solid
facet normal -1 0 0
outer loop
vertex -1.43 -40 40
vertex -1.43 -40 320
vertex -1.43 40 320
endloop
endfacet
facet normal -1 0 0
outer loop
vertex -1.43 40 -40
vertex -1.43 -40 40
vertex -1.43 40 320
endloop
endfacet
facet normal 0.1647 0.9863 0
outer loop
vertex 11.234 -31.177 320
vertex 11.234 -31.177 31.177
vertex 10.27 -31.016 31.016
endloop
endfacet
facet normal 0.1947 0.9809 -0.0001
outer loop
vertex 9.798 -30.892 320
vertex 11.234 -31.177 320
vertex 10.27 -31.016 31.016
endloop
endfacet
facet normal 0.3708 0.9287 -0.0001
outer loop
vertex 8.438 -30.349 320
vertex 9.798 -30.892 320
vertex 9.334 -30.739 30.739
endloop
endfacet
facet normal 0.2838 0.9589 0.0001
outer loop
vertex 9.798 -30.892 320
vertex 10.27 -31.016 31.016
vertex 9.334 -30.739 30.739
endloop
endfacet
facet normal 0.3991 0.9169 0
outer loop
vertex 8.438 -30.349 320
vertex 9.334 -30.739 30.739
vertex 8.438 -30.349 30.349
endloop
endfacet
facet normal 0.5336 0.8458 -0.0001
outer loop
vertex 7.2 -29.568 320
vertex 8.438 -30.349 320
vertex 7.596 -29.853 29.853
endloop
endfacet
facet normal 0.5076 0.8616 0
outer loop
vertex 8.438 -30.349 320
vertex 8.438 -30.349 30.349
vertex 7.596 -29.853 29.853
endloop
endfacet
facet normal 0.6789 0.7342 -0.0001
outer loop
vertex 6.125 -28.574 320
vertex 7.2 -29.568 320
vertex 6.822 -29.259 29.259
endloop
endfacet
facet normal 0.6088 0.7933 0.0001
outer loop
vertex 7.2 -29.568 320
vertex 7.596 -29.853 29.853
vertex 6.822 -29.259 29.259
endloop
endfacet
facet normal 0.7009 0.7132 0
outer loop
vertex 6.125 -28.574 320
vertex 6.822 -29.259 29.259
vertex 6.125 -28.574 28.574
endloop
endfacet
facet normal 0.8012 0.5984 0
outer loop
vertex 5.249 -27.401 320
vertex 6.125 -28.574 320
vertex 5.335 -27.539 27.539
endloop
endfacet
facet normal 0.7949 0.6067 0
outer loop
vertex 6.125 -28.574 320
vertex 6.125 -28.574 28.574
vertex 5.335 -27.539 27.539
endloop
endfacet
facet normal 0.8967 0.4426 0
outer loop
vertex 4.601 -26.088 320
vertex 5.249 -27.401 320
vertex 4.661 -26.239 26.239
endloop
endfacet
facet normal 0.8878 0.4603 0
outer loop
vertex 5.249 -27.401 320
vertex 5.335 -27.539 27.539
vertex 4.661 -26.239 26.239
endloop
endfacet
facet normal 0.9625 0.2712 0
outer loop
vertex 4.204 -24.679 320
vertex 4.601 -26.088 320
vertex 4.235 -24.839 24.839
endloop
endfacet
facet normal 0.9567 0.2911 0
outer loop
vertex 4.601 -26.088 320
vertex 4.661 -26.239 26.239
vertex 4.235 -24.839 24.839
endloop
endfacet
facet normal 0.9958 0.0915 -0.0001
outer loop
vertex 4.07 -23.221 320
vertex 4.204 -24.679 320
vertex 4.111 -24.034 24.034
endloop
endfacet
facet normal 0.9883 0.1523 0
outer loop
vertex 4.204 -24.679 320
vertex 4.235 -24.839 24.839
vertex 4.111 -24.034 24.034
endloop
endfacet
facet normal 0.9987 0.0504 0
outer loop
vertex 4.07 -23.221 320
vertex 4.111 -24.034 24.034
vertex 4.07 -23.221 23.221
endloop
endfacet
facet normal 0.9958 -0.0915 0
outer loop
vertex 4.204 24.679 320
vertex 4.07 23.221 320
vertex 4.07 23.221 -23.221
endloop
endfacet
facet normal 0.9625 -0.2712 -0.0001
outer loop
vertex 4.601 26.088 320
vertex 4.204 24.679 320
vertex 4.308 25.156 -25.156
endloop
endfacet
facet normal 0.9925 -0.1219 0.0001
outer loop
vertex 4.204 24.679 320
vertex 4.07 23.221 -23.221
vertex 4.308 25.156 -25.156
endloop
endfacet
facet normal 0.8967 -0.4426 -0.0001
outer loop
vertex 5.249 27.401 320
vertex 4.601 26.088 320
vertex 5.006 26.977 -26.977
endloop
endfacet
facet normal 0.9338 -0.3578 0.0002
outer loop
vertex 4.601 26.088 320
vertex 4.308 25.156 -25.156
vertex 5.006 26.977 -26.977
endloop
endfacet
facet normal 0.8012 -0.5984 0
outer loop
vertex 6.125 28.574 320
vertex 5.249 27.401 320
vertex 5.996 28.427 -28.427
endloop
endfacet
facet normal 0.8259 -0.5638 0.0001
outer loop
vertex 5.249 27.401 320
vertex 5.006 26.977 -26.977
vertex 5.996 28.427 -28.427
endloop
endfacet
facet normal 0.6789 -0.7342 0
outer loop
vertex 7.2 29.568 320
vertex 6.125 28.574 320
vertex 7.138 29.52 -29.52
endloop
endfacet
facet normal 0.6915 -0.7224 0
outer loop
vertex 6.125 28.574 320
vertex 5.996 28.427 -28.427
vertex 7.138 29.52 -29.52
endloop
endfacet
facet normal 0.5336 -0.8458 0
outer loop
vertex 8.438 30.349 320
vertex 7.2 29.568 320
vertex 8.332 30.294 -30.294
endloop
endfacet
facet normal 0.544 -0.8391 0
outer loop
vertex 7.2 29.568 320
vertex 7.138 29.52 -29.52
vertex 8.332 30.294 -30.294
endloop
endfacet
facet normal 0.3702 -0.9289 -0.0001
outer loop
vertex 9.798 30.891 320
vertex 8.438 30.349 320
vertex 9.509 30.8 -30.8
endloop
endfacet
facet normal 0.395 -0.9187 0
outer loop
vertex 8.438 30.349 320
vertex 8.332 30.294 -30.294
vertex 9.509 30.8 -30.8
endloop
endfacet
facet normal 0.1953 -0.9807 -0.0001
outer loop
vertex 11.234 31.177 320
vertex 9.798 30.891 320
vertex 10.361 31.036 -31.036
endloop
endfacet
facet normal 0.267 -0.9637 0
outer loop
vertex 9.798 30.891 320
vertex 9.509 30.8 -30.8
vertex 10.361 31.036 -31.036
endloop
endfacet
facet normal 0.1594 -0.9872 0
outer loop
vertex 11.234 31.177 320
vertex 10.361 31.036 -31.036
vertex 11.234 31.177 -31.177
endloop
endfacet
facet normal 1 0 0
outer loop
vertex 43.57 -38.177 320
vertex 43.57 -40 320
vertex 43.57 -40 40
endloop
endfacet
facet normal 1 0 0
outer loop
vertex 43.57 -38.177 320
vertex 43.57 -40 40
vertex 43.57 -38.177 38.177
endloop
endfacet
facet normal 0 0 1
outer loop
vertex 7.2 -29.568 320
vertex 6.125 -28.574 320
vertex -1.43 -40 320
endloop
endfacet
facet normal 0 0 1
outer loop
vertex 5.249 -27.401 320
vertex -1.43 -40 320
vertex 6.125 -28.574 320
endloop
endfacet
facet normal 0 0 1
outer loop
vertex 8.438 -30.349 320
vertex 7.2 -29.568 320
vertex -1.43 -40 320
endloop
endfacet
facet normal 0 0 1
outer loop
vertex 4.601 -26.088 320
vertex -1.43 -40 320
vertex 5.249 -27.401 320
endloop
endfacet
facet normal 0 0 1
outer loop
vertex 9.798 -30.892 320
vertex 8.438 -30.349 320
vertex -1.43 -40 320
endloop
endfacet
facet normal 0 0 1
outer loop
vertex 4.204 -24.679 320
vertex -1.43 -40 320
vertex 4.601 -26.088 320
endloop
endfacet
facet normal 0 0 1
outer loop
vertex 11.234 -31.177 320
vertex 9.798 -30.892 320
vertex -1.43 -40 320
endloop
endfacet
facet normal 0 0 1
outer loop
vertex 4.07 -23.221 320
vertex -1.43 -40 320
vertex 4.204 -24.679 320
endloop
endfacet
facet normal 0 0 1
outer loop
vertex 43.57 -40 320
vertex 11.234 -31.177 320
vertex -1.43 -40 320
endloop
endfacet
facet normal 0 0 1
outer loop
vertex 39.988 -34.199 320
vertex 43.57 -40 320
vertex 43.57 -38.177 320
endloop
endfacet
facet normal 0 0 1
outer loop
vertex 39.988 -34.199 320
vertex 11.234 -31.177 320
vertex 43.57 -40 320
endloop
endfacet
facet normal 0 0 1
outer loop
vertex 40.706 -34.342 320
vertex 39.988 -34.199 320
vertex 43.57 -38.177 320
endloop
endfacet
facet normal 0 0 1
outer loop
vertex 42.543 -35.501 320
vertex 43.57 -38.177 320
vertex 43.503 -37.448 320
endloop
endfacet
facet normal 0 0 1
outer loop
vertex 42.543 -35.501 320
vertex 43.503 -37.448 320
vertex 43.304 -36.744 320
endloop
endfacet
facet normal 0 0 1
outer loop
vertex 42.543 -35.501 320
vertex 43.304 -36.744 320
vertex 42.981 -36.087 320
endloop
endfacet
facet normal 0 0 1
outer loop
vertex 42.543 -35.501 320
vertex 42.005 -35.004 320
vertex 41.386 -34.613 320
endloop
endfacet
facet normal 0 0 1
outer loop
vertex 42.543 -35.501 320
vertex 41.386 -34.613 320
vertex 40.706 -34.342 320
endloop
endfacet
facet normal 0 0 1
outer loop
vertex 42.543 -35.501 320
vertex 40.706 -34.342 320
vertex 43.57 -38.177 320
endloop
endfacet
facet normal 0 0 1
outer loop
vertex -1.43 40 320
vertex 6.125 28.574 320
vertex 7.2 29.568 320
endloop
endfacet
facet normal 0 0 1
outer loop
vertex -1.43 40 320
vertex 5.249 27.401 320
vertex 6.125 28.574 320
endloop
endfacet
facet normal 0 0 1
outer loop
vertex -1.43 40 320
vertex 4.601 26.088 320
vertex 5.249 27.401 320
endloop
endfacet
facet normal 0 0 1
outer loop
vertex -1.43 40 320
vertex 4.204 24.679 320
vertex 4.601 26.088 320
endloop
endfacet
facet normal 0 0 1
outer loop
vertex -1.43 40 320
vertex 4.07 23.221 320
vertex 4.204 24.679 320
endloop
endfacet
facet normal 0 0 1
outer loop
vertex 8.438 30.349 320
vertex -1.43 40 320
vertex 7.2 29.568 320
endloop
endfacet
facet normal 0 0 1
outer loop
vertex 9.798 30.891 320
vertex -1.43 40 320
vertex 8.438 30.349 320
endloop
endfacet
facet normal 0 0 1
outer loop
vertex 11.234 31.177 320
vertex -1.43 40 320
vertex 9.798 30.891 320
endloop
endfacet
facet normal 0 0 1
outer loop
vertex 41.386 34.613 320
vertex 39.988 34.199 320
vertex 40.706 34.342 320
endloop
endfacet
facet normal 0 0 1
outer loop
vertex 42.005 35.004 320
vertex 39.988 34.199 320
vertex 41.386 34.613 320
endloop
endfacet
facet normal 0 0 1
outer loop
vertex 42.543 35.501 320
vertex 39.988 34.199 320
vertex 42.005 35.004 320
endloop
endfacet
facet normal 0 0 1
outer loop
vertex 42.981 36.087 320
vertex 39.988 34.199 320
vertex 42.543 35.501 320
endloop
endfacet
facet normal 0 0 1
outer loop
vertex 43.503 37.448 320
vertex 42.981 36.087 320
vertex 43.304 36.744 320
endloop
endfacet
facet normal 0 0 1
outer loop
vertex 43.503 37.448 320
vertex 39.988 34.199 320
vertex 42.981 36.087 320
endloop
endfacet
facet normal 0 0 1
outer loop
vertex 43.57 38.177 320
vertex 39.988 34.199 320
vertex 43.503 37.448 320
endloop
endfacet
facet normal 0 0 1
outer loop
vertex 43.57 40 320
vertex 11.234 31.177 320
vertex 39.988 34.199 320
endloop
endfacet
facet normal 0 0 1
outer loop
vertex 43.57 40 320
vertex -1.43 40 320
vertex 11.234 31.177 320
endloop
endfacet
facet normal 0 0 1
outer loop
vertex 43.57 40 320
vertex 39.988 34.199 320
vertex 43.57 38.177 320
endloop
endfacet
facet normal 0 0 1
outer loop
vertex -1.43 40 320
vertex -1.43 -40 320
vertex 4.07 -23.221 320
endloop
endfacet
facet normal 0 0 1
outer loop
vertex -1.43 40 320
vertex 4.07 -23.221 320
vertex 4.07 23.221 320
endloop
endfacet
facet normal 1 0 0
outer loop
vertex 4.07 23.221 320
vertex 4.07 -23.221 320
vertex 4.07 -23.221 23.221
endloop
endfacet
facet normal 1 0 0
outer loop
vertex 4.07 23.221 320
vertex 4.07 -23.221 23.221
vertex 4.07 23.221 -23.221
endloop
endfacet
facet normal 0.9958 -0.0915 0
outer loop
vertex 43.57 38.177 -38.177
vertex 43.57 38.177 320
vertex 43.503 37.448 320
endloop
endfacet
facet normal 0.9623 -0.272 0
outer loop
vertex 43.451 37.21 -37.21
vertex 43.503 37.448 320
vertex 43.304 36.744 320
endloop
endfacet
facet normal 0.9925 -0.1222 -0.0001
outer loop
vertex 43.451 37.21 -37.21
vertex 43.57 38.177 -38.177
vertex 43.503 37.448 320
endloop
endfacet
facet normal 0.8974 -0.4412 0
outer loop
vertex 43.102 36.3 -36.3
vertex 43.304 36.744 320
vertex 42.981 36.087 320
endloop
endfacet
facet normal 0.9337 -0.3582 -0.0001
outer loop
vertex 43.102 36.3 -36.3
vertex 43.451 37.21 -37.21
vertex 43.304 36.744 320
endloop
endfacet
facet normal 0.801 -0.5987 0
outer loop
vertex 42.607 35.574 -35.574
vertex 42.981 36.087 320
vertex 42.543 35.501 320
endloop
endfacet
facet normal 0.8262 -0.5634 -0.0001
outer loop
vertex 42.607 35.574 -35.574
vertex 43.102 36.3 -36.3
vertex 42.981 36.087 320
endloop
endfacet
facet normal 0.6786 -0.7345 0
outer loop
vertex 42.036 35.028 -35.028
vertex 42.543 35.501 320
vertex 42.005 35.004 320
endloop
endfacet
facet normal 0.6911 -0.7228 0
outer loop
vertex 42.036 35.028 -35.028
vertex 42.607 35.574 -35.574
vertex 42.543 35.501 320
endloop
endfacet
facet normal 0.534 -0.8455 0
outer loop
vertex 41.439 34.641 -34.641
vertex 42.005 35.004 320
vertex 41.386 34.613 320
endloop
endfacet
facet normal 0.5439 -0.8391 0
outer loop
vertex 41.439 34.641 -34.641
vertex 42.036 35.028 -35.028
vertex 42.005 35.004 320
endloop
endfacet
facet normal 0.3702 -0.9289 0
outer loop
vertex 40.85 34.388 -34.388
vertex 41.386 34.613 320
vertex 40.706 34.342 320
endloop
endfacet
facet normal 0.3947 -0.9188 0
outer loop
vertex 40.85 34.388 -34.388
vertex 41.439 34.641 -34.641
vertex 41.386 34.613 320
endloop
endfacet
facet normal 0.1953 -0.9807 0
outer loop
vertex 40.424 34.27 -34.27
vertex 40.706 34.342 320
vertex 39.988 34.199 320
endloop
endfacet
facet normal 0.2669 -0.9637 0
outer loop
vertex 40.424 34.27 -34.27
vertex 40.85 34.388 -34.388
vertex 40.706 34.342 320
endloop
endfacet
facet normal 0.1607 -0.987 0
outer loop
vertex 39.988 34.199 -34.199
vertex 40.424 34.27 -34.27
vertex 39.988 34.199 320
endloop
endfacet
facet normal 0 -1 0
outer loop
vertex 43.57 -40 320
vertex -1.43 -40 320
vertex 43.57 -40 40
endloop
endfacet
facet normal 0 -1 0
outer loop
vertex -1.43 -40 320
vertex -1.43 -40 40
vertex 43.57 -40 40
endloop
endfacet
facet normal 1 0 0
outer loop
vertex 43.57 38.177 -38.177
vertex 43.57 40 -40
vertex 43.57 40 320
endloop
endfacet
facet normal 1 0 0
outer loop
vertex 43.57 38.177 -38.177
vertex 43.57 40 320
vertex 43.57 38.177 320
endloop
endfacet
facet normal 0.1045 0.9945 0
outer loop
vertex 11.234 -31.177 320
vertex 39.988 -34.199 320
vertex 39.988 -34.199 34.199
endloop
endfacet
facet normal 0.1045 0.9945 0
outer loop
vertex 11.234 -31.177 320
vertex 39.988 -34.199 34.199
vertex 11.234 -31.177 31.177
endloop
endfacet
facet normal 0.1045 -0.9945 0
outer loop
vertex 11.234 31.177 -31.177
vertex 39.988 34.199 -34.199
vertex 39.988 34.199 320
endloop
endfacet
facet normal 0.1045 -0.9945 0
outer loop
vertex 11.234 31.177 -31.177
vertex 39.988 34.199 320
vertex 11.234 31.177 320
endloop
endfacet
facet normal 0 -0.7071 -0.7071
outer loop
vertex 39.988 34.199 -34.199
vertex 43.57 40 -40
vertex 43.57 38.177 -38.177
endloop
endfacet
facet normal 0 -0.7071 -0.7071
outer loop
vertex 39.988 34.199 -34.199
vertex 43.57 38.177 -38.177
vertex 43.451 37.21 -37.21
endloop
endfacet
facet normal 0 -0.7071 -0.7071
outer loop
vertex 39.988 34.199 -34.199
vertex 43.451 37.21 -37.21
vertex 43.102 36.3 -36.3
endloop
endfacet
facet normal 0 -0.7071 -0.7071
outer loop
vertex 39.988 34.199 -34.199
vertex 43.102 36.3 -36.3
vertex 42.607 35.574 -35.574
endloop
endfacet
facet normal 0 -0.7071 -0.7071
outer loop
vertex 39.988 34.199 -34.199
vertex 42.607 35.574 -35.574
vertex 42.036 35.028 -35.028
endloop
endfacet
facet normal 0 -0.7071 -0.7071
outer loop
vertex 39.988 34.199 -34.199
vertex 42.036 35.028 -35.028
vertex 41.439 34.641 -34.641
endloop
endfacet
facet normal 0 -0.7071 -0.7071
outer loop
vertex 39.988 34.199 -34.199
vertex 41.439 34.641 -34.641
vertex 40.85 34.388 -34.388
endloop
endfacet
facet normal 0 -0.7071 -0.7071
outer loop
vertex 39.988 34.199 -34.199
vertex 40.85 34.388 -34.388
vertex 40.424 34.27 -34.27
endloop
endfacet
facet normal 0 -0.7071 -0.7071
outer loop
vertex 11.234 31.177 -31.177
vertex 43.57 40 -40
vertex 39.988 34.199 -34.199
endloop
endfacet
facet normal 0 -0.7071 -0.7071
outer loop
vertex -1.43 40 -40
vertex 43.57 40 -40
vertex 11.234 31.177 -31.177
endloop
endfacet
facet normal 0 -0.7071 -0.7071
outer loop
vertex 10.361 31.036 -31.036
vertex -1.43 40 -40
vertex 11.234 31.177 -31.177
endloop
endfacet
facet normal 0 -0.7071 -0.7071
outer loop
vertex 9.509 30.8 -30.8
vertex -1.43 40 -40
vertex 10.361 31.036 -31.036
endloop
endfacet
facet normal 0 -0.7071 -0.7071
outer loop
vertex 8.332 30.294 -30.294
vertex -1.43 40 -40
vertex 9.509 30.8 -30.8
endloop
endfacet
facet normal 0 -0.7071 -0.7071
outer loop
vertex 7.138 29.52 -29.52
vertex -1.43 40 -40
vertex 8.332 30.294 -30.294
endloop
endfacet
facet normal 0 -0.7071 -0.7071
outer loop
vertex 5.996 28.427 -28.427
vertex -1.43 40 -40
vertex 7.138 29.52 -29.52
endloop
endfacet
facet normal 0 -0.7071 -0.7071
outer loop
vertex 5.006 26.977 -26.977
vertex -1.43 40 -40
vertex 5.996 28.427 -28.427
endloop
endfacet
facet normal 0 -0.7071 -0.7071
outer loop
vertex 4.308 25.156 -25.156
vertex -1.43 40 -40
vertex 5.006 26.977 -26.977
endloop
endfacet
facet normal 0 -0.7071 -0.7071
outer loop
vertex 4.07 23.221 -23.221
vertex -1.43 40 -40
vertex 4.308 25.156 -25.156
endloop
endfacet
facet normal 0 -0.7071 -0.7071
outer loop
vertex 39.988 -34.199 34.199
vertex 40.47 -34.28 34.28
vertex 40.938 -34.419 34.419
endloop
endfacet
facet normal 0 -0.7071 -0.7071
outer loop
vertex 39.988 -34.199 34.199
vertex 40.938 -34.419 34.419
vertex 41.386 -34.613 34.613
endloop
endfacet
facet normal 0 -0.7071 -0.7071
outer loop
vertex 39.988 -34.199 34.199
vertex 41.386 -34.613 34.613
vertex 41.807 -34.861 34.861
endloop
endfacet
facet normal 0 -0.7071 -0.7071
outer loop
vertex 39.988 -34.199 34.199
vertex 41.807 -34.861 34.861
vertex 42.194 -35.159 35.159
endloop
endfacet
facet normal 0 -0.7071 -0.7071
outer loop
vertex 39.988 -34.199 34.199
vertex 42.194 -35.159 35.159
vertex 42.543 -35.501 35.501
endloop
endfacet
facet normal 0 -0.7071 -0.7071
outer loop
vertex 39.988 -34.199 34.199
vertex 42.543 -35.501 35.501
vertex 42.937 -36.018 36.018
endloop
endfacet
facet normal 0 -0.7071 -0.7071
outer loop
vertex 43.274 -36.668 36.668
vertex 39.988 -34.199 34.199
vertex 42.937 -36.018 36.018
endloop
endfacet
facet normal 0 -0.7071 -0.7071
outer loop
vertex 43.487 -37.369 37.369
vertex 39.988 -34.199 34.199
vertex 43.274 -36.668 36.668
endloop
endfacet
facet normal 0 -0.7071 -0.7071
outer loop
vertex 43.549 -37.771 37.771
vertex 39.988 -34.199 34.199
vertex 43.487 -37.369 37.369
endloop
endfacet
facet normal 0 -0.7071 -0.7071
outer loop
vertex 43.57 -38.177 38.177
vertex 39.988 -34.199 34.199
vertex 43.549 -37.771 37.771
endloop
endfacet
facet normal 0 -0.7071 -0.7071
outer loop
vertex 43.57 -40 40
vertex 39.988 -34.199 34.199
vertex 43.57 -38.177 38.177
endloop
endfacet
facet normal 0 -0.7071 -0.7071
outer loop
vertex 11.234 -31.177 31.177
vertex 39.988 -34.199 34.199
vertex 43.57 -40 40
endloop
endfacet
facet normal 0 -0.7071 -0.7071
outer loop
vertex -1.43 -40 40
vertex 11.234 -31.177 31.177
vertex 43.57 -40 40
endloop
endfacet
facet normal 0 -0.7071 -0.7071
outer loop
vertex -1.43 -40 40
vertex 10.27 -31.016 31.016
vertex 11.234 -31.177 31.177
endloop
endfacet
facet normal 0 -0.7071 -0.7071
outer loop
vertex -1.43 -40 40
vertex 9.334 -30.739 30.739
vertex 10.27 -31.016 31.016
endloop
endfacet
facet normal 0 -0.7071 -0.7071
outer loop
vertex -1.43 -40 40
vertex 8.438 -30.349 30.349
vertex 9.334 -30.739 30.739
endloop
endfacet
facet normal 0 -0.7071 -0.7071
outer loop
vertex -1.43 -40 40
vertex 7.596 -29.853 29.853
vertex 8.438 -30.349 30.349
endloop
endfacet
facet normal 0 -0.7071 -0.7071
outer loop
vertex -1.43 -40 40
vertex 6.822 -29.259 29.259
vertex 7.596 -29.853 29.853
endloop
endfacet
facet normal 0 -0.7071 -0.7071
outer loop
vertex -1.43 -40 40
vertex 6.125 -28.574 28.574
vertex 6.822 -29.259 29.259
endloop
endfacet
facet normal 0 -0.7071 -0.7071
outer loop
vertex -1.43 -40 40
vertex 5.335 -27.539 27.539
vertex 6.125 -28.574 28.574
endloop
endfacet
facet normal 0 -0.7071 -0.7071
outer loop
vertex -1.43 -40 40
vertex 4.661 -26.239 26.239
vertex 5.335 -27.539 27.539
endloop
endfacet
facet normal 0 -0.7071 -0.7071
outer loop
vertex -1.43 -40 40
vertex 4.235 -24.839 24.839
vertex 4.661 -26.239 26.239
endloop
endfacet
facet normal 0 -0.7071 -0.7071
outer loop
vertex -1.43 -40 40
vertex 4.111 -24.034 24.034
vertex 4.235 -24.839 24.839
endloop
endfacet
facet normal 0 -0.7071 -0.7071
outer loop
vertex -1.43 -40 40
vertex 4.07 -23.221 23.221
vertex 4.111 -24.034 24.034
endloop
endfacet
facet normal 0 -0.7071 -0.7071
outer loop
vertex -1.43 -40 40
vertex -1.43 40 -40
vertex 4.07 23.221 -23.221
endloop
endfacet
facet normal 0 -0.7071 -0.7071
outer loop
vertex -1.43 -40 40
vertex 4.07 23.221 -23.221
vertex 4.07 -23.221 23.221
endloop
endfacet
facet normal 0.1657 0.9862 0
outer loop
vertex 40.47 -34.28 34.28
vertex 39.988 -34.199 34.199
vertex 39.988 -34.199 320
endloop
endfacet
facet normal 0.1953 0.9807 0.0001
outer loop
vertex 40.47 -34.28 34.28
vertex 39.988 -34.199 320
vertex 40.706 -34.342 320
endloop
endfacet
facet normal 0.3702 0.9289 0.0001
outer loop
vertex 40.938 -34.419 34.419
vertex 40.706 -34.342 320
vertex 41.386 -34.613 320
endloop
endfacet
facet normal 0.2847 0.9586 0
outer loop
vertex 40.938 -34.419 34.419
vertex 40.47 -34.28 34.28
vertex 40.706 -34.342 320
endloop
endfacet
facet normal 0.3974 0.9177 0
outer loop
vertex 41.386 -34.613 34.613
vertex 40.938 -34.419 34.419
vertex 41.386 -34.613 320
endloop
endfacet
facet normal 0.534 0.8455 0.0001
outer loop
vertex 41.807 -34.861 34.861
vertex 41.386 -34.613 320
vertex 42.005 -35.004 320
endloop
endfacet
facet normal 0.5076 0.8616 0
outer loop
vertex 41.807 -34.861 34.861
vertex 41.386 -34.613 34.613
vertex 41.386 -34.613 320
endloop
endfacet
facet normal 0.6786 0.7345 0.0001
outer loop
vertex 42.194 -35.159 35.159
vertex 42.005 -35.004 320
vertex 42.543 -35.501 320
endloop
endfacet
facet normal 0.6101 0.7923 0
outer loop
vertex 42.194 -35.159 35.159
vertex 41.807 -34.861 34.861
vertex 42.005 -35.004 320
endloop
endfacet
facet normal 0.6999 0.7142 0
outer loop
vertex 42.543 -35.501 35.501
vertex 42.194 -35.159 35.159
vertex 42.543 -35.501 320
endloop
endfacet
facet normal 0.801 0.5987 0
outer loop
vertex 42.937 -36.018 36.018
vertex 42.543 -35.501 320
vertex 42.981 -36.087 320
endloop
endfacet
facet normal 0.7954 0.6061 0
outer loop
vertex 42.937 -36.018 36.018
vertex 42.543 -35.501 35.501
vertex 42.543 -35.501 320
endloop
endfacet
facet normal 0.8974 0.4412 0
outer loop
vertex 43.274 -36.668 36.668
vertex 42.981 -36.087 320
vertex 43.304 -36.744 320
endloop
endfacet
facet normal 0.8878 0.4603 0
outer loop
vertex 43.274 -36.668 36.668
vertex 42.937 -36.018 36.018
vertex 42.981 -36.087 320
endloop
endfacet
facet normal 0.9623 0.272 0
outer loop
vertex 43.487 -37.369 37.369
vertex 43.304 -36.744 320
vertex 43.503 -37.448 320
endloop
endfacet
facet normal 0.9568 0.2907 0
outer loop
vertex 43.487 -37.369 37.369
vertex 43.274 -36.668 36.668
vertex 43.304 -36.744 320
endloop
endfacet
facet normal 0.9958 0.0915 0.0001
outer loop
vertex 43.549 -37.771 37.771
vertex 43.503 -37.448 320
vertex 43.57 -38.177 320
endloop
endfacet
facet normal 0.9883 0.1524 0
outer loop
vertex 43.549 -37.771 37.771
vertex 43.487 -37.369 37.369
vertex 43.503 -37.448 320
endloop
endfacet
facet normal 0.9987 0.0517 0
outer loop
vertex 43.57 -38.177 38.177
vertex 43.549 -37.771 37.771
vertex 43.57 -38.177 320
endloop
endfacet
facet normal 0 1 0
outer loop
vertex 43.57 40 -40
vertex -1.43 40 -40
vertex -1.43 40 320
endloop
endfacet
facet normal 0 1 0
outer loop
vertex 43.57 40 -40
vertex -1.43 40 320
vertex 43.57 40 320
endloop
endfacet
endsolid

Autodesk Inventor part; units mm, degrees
ref_plane "Начальная плоскость" through (0, 0, -40) normal (0, 0, 1) x (1, 0, 0)
ref_plane "Конечная плоскость" through (0, 0, 320) normal (0, 0, 1) x (1, 0, 0)
sketch "Эскиз" plane through (0, 0, 0) normal (0, 0, 1) x (1, 0, 0)
  line L0 (-1.43, 0) -> (-1.43, 40)
  line L1 (-1.43, 40) -> (43.57, 40)
  line L2 (43.57, 40) -> (43.57, 38.1774)
  line L3 (39.9881, 34.1993) -> (11.2338, 31.1771)
  line L4 (4.07, 23.221) -> (4.07, 0)
  line L5 (4.07, 0) -> (-1.43, 0) construction
  line L6 (23.82, 40) -> (23.82, 32.5) construction
  line L7 (43.57, 34.5758) -> (43.57, 32.5) construction
  line L8 (43.57, 32.5) -> (23.82, 32.5) construction
  line L9 (0, 15) -> (0, -27) construction
  line L10 (-5.539, 0) -> (16.0067, 0) construction
  line L11 (-1.43, 0) -> (-1.43, -40)
  line L12 (-1.43, -40) -> (43.57, -40)
  line L13 (43.57, -40) -> (43.57, -38.1774)
  line L14 (39.9881, -34.1993) -> (11.2338, -31.1771)
  line L15 (4.07, -23.221) -> (4.07, 0)
  arc A0 (11.2338, 31.1771) -> (4.07, 23.221) centre (12.07, 23.221) ccw
  arc A1 (4.07, -23.221) -> (11.2338, -31.1771) centre (12.07, -23.221) ccw
  arc A2 (39.9881, 34.1993) -> (43.57, 38.1774) centre (39.57, 38.1774) ccw
  arc A3 (43.57, -38.1774) -> (39.9881, -34.1993) centre (39.57, -38.1774) ccw
  line L16 (0, 56) -> (0, -56) construction
  line L17 (-15.5135, 0) -> (54.308, 0) construction
  point P0 (4.07, 30.4242)
  point P1 (43.57, -34.5758)
  point P2 (4.07, -30.4242)
  point P3 (23.82, -40)
  point P4 (23.82, -32.5)
  dimension "d0" = 5.5
  dimension "d1" = 40
  dimension "d2" = 45
  dimension "d3" = 7.5
  dimension "d4" = 19.75
  dimension "d5" = 2.0758
  dimension "d23" = 8
  dimension "d24" = 4
  dimension "d25" = 1.43
extrude "Тело" add sketch "Эскиз" along normal up to surface (360 mm away) from surface at -40
sketch "Sketch3" plane through (0, 0, 0) normal (0, 0, 1) x (1, 0, 0)
  line L0 (0, 0) -> (10, 0)
ref_plane "Work Plane3" through (0, 0, 0) normal (0, -1, 0) x (1, 0, 0)
sketch "Sketch4" plane through (0, 0, 0) normal (0, -1, 0) x (1, 0, 0)
  line L0 (-2, -40) -> (12, -40)
  line L1 (-2, 320) -> (12, 320)
  dimension "d29" = 360
ref_plane "РабПлоскость4" through (21.07, 40, -40) normal (0, -0.7071, -0.7071) x (1, 0, 0)
split "Разделение1" plane through (21.07, 40, -40) removes the side toward (0, -0.7071, -0.7071)
equation "\"d0\" = G_T"
equation "\"d1\" = 0.5 * G_H"
equation "\"d2\" = G_W"
equation "\"d3\" = G_T1"
equation "\"d4\" = G_C"
equation "\"d23\" = G_IR"
equation "\"d24\" = G_ER"
equation "\"d25\" = ex"
equation "\"d6\" = G_L"
equation "\"G_W\" = 45"
equation "\"G_T\" = 5.5"
equation "\"G_T1\" = 7.5"
equation "\"G_NG\" = 0.105104"
equation "\"G_ER\" = 4"
equation "\"G_IR\" = 8"
equation "\"G_C\" = 19.75"
equation "\"G_L\" = d29"
equation "\"ex\" = 1.43"
equation "\"G_OFFSET_END\" = 0"
equation "\"G_H\" = 80"
properties part number "ISO 657/11 - CH 80 x 8 - 360" material "Сталь, мягкая"
